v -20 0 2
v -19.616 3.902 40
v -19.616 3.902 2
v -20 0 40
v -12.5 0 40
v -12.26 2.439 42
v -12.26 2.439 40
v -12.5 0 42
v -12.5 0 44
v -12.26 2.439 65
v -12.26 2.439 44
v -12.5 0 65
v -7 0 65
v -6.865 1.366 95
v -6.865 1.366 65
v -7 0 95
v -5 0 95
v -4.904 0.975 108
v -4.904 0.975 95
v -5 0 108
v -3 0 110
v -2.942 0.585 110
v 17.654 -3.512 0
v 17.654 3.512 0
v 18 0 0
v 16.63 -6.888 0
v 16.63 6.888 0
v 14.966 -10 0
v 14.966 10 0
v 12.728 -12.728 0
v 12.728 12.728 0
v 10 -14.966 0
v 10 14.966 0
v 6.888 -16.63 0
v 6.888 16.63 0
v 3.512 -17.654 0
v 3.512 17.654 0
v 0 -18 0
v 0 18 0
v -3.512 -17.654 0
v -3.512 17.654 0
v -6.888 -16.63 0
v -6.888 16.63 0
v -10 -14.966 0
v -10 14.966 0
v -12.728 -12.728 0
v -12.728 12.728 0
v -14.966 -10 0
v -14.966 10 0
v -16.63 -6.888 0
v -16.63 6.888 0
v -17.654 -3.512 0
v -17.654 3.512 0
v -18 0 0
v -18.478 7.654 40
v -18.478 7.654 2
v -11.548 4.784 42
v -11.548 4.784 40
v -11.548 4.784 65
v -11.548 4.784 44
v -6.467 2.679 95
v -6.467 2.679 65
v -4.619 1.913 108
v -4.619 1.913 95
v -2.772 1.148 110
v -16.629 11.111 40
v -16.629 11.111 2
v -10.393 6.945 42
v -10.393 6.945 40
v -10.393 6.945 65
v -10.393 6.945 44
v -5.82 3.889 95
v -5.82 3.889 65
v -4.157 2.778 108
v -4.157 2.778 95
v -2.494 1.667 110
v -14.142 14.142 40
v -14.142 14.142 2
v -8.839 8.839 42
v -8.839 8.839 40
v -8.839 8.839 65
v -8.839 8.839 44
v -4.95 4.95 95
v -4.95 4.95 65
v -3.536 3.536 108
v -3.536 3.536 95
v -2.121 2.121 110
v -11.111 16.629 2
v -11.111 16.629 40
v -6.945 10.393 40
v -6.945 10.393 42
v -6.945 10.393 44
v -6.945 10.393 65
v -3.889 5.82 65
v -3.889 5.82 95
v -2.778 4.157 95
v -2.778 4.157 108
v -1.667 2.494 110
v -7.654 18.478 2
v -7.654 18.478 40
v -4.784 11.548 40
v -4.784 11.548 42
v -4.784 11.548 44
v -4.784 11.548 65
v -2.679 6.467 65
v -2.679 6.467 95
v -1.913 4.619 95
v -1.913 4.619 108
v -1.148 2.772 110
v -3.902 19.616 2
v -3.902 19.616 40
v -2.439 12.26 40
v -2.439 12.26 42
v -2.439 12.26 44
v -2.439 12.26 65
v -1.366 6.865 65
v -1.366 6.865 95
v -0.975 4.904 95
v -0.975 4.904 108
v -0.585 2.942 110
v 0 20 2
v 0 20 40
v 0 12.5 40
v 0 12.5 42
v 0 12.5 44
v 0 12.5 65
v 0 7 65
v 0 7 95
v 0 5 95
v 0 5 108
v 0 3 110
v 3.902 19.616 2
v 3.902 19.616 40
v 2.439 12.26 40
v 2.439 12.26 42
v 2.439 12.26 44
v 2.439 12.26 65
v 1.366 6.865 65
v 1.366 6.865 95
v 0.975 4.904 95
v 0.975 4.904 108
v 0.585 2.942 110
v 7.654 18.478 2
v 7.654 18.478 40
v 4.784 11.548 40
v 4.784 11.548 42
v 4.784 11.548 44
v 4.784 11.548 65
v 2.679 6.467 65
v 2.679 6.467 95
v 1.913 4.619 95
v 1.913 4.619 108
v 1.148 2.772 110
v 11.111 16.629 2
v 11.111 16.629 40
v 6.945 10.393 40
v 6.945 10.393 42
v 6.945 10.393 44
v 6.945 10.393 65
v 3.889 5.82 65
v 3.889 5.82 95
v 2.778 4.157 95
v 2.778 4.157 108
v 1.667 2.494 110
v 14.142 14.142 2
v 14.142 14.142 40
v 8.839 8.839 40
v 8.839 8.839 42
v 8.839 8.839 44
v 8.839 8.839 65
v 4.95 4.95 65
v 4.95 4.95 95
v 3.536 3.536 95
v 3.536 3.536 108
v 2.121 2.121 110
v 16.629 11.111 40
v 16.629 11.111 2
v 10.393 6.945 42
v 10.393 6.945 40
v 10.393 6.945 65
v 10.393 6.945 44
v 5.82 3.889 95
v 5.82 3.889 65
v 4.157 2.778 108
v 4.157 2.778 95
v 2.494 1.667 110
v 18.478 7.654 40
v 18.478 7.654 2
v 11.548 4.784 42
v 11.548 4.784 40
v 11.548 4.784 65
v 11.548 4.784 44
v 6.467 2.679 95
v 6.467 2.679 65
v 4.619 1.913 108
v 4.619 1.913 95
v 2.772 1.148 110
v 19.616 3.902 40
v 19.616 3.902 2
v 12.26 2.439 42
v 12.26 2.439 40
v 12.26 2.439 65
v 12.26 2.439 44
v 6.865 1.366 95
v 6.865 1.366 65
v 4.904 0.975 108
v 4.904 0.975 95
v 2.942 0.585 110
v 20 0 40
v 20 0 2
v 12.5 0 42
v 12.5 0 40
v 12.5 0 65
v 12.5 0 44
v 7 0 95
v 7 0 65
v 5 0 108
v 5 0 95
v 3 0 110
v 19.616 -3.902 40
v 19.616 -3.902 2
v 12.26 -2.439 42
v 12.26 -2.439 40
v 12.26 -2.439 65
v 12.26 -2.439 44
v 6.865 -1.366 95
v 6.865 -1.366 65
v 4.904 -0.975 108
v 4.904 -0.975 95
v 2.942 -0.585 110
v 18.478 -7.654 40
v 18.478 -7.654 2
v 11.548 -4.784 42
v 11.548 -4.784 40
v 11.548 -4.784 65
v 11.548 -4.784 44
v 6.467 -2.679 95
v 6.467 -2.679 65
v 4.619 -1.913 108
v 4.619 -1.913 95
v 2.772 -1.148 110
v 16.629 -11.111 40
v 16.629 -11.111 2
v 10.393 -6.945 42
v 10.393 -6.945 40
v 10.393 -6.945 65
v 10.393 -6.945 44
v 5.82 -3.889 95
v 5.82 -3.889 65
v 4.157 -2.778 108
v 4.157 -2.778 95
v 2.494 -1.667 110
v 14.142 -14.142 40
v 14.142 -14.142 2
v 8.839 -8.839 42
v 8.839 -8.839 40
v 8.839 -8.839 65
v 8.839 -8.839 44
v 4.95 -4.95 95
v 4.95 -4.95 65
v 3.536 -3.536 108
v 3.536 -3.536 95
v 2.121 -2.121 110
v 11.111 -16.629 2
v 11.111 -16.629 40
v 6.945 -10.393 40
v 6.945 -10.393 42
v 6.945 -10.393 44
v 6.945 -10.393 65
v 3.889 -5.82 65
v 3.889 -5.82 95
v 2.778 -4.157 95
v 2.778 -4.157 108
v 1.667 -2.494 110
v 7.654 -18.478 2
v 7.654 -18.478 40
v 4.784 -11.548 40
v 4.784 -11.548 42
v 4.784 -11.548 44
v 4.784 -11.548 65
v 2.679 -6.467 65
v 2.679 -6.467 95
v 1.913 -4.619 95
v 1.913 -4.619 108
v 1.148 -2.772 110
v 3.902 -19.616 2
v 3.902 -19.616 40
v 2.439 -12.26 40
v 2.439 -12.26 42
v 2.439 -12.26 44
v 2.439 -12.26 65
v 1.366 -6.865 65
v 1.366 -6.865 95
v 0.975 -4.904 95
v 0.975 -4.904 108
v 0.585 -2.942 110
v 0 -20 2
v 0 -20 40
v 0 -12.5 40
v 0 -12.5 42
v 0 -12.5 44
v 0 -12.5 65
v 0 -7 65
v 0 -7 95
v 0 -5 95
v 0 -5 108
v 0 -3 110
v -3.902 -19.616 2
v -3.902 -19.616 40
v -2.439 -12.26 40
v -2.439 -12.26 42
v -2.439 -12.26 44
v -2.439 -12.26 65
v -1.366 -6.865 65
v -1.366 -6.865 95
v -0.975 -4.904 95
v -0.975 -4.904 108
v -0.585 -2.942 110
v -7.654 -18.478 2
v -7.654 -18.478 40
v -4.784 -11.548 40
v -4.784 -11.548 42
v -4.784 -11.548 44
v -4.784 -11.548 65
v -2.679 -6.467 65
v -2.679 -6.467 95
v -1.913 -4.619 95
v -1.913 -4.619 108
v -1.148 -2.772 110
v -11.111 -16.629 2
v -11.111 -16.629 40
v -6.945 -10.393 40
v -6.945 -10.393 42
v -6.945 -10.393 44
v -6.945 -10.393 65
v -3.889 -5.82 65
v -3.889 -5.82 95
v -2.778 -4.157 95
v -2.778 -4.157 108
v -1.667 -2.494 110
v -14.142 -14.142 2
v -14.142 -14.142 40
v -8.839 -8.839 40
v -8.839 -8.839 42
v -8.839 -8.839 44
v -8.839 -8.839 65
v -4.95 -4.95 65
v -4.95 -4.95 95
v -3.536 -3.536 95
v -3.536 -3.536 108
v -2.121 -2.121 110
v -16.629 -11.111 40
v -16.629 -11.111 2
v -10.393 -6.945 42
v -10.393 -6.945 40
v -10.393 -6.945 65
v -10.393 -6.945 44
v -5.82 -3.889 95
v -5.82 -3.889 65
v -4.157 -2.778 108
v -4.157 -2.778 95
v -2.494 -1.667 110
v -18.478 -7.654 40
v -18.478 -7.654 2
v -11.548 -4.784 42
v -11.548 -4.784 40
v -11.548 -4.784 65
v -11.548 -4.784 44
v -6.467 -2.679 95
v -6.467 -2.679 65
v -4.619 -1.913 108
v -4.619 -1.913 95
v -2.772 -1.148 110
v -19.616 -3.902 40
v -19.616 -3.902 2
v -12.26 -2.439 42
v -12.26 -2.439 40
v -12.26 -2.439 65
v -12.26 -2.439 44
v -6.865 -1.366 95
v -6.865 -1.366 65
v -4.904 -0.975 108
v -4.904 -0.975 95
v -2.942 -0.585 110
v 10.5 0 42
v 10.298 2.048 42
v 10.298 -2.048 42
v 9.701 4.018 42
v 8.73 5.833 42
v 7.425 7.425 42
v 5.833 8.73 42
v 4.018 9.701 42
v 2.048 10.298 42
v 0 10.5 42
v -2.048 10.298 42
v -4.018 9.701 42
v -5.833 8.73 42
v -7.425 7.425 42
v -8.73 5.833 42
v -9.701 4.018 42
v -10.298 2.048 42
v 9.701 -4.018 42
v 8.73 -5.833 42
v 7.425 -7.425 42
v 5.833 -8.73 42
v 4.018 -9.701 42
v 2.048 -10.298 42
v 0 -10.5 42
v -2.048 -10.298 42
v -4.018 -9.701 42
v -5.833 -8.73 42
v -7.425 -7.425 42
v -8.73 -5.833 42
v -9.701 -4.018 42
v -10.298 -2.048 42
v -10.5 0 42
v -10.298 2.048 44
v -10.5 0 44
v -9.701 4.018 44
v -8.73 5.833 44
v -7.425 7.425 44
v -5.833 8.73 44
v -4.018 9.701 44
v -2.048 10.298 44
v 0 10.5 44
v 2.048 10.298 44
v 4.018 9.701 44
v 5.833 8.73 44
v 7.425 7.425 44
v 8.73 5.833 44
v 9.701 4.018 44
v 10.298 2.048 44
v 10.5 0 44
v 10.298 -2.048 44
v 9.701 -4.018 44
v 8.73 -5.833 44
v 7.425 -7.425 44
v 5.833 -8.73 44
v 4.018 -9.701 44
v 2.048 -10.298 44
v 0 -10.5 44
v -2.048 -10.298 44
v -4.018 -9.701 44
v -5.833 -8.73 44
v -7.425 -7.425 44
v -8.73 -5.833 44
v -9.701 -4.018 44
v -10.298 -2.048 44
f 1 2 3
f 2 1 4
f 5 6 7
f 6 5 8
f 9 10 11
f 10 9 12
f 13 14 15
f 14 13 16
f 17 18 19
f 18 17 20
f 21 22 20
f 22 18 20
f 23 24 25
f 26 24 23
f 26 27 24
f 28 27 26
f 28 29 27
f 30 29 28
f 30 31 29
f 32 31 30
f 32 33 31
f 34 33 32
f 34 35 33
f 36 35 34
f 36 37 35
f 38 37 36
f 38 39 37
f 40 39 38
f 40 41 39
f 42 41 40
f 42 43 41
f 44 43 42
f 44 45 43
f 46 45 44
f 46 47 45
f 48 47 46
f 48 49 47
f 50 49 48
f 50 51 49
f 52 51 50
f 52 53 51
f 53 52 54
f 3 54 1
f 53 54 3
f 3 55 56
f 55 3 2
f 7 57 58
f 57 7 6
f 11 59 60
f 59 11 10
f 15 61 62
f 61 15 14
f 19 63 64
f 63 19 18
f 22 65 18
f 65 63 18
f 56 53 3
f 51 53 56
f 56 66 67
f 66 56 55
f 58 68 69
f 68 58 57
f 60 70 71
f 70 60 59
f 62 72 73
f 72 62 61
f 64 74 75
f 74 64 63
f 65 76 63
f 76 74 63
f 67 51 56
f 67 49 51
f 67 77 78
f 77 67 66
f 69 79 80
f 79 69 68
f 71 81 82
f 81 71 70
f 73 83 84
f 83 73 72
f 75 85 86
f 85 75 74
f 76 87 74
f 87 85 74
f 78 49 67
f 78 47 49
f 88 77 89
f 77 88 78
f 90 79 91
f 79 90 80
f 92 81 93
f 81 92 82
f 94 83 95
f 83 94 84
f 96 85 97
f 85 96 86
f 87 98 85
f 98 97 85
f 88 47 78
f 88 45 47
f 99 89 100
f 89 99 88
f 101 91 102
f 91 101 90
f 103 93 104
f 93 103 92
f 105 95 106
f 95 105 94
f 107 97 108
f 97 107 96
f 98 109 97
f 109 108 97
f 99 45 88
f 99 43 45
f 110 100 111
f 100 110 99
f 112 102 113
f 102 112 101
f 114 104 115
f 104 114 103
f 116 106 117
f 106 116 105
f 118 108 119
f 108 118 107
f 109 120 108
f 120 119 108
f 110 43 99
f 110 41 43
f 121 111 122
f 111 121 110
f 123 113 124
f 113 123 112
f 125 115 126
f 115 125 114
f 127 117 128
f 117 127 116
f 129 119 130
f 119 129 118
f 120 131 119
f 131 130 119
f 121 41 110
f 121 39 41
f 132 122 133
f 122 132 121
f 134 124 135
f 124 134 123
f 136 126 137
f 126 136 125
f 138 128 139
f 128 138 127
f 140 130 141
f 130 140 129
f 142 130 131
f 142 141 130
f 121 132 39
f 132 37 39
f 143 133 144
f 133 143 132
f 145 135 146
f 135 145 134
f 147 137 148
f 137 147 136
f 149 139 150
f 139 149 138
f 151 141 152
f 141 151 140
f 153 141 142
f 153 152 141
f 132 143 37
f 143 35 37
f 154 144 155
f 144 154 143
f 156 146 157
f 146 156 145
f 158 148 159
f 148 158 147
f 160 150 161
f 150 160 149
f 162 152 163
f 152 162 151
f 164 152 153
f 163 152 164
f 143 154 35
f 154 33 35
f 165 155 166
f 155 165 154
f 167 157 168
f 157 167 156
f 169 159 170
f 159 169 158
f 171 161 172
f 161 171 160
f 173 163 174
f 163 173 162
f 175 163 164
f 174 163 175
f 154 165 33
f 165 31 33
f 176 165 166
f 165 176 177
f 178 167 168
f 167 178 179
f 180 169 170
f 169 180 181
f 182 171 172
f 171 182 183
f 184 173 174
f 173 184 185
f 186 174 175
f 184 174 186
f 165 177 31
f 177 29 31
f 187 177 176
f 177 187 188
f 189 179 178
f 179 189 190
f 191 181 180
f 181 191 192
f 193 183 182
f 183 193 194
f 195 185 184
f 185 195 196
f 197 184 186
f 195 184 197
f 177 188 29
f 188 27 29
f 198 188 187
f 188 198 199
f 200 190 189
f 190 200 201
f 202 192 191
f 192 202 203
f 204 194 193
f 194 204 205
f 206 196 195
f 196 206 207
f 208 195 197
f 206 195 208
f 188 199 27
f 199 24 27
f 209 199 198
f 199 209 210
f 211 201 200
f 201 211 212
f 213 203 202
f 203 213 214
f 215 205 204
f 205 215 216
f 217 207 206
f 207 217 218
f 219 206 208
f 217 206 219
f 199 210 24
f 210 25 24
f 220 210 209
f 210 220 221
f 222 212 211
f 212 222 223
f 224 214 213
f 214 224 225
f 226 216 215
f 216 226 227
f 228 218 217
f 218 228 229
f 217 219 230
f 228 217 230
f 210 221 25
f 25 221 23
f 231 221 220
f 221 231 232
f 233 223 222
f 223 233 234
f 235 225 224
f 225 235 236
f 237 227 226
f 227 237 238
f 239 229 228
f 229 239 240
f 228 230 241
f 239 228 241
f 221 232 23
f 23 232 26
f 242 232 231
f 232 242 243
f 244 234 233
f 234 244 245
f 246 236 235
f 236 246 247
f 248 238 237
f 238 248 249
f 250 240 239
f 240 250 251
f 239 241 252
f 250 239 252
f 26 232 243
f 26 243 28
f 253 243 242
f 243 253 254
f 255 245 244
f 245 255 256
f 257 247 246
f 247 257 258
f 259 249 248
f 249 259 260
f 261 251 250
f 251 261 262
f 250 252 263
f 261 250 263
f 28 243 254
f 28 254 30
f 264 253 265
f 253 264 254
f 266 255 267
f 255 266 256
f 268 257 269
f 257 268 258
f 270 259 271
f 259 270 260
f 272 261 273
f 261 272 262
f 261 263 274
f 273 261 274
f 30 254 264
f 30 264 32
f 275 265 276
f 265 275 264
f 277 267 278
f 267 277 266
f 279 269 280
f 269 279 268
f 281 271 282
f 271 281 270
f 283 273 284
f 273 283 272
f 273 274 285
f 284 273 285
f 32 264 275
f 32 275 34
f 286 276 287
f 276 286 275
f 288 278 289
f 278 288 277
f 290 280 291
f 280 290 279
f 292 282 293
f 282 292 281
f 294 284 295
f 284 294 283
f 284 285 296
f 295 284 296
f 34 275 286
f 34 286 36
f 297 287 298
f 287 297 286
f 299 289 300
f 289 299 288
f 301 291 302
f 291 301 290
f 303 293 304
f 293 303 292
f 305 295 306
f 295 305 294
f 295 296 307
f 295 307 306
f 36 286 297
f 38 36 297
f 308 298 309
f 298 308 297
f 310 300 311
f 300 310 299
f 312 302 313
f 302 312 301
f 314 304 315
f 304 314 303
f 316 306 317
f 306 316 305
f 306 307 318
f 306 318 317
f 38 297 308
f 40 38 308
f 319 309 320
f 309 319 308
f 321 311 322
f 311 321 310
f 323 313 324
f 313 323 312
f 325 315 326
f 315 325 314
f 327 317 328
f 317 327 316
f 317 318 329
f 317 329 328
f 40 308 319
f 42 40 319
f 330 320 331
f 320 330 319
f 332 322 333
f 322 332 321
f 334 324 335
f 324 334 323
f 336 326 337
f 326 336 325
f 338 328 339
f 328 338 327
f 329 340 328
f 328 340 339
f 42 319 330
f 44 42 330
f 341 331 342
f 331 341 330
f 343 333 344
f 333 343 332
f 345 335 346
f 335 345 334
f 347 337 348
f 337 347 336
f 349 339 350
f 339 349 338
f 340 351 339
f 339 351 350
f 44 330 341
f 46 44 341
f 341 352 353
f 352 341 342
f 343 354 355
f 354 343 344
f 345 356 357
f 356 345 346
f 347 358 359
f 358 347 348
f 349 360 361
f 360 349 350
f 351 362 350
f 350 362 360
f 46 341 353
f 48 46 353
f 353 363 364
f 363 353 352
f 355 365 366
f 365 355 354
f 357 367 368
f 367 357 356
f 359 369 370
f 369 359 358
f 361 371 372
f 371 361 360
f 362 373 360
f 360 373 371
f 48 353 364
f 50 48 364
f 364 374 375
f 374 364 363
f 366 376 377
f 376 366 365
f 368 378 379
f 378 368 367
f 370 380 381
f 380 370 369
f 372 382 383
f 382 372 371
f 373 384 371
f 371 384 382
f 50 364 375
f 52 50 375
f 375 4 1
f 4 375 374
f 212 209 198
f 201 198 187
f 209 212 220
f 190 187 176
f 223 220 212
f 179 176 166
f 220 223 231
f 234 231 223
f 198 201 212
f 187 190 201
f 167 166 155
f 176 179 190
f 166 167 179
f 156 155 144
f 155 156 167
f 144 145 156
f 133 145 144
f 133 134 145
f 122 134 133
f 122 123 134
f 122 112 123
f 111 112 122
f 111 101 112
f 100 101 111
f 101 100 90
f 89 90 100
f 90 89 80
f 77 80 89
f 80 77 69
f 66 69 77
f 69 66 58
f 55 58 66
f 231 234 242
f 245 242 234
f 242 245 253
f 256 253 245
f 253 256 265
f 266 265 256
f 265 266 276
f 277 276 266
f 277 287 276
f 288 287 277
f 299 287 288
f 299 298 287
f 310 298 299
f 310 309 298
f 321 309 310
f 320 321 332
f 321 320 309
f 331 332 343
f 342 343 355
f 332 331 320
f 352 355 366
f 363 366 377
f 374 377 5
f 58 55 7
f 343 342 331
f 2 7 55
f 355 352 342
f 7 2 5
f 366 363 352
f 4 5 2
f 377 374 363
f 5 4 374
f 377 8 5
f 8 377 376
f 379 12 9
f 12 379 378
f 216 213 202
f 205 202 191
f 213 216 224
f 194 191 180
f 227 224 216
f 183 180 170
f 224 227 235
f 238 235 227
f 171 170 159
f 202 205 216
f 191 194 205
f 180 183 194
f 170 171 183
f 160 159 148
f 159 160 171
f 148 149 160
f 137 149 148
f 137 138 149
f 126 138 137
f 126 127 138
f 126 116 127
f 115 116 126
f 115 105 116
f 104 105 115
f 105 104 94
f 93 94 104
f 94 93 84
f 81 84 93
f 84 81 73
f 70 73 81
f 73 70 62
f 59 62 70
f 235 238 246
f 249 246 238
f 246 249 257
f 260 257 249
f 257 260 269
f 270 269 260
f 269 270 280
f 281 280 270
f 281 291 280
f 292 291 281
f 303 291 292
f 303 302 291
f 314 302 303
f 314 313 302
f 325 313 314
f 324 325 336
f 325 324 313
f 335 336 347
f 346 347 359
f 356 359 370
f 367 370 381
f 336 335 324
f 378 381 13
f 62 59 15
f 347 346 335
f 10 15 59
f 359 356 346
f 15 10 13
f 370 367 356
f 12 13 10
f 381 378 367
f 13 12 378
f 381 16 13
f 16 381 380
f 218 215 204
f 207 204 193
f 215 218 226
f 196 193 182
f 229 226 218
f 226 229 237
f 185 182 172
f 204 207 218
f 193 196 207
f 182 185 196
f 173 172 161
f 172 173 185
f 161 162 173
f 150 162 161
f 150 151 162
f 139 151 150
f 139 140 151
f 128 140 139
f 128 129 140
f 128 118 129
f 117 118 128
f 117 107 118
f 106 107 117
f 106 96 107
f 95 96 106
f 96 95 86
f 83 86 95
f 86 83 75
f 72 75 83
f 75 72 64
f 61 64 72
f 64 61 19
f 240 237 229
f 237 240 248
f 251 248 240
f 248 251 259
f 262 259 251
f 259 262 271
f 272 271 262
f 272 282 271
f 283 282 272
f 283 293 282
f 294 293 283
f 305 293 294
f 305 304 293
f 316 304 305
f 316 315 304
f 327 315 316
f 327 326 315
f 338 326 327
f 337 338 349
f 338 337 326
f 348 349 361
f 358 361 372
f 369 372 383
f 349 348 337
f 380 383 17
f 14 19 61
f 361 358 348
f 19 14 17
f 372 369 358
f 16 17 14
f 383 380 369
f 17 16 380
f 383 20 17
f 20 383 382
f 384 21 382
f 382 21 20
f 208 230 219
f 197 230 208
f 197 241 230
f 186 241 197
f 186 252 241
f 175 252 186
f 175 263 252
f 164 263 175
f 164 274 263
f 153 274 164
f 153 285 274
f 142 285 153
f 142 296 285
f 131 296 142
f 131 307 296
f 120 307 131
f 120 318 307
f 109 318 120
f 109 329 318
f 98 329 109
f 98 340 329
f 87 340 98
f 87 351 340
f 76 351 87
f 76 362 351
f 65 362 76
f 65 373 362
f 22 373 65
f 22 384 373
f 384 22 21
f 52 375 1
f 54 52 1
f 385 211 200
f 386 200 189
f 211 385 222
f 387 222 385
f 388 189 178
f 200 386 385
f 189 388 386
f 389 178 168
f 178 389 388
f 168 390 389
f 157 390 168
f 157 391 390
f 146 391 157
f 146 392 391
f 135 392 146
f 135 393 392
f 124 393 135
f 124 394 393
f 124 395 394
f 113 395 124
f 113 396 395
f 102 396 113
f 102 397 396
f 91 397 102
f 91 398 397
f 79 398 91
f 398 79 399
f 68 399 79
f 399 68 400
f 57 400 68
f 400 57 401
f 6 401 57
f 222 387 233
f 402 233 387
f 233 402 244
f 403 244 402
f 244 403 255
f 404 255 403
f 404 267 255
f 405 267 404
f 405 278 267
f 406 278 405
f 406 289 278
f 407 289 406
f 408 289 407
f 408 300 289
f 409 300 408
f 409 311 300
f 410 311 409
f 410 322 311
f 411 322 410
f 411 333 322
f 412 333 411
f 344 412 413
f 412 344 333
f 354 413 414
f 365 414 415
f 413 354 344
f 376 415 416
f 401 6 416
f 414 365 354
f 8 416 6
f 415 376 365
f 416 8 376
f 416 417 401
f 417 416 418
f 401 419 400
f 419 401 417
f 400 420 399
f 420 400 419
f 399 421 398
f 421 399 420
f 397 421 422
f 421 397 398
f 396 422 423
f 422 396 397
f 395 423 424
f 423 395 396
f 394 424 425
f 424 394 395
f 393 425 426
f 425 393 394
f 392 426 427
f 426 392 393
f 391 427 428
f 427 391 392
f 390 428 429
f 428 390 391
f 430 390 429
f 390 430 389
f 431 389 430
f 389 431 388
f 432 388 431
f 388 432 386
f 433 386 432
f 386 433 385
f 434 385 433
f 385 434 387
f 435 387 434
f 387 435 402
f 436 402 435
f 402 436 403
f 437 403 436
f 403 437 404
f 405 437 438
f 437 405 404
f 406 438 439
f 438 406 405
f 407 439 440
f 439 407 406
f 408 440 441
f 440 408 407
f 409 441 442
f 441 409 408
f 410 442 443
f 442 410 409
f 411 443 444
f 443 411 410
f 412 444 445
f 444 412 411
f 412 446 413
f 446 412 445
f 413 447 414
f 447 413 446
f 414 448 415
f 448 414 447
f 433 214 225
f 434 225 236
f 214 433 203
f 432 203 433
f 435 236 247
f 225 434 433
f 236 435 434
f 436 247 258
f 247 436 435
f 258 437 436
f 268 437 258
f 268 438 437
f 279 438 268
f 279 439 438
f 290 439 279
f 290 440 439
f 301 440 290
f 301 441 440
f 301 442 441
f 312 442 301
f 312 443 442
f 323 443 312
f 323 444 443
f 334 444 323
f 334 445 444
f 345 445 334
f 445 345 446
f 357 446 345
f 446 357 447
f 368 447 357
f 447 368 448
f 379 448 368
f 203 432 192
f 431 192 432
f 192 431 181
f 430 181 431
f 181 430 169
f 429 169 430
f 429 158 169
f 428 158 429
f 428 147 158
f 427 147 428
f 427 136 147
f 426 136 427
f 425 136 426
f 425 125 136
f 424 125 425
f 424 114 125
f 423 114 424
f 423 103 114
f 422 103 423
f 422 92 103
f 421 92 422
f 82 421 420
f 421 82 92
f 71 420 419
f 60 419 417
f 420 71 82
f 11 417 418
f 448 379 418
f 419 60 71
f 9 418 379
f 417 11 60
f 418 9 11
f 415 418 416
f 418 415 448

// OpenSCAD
$fn = 32;

// ----------------------------------------------------------------------
// Stepped shaft: diameters 40, 25, 14, 10 mm, 110 mm long
// ----------------------------------------------------------------------

// --- parameters (mm) ---
d1 = 40;                  // step 1 diameter
len1 = 40;                // step 1 length
d2 = 25;                  // step 2 diameter
len2 = 25;                // step 2 length
d3 = 14;                  // step 3 diameter
len3 = 30;                // step 3 length
d4 = 10;                  // step 4 diameter
len4 = 15;                // step 4 length
total = 110;              // overall length
chamfer = 2;              // end chamfer
groove_r = 12.5;          // groove radius
groove_z = 42;            // groove position from the end
groove_w = 2;             // groove width
groove_d = 2;             // groove depth

/* closed turning profile: x is the radius, y is the length */
profile = [[0, 0], [20 - chamfer, 0], [20, chamfer], [20, 40], [12.5, 40], [12.5, 65], [7, 65], [7, 95], [5, 95], [5, 108], [3, 110], [0, 110]];

difference() {
  rotate_extrude() polygon(profile);
  /* circlip groove just behind the shoulder */
  rotate_extrude() translate([groove_r - groove_d, groove_z]) square([groove_d + 1, groove_w]);
}
